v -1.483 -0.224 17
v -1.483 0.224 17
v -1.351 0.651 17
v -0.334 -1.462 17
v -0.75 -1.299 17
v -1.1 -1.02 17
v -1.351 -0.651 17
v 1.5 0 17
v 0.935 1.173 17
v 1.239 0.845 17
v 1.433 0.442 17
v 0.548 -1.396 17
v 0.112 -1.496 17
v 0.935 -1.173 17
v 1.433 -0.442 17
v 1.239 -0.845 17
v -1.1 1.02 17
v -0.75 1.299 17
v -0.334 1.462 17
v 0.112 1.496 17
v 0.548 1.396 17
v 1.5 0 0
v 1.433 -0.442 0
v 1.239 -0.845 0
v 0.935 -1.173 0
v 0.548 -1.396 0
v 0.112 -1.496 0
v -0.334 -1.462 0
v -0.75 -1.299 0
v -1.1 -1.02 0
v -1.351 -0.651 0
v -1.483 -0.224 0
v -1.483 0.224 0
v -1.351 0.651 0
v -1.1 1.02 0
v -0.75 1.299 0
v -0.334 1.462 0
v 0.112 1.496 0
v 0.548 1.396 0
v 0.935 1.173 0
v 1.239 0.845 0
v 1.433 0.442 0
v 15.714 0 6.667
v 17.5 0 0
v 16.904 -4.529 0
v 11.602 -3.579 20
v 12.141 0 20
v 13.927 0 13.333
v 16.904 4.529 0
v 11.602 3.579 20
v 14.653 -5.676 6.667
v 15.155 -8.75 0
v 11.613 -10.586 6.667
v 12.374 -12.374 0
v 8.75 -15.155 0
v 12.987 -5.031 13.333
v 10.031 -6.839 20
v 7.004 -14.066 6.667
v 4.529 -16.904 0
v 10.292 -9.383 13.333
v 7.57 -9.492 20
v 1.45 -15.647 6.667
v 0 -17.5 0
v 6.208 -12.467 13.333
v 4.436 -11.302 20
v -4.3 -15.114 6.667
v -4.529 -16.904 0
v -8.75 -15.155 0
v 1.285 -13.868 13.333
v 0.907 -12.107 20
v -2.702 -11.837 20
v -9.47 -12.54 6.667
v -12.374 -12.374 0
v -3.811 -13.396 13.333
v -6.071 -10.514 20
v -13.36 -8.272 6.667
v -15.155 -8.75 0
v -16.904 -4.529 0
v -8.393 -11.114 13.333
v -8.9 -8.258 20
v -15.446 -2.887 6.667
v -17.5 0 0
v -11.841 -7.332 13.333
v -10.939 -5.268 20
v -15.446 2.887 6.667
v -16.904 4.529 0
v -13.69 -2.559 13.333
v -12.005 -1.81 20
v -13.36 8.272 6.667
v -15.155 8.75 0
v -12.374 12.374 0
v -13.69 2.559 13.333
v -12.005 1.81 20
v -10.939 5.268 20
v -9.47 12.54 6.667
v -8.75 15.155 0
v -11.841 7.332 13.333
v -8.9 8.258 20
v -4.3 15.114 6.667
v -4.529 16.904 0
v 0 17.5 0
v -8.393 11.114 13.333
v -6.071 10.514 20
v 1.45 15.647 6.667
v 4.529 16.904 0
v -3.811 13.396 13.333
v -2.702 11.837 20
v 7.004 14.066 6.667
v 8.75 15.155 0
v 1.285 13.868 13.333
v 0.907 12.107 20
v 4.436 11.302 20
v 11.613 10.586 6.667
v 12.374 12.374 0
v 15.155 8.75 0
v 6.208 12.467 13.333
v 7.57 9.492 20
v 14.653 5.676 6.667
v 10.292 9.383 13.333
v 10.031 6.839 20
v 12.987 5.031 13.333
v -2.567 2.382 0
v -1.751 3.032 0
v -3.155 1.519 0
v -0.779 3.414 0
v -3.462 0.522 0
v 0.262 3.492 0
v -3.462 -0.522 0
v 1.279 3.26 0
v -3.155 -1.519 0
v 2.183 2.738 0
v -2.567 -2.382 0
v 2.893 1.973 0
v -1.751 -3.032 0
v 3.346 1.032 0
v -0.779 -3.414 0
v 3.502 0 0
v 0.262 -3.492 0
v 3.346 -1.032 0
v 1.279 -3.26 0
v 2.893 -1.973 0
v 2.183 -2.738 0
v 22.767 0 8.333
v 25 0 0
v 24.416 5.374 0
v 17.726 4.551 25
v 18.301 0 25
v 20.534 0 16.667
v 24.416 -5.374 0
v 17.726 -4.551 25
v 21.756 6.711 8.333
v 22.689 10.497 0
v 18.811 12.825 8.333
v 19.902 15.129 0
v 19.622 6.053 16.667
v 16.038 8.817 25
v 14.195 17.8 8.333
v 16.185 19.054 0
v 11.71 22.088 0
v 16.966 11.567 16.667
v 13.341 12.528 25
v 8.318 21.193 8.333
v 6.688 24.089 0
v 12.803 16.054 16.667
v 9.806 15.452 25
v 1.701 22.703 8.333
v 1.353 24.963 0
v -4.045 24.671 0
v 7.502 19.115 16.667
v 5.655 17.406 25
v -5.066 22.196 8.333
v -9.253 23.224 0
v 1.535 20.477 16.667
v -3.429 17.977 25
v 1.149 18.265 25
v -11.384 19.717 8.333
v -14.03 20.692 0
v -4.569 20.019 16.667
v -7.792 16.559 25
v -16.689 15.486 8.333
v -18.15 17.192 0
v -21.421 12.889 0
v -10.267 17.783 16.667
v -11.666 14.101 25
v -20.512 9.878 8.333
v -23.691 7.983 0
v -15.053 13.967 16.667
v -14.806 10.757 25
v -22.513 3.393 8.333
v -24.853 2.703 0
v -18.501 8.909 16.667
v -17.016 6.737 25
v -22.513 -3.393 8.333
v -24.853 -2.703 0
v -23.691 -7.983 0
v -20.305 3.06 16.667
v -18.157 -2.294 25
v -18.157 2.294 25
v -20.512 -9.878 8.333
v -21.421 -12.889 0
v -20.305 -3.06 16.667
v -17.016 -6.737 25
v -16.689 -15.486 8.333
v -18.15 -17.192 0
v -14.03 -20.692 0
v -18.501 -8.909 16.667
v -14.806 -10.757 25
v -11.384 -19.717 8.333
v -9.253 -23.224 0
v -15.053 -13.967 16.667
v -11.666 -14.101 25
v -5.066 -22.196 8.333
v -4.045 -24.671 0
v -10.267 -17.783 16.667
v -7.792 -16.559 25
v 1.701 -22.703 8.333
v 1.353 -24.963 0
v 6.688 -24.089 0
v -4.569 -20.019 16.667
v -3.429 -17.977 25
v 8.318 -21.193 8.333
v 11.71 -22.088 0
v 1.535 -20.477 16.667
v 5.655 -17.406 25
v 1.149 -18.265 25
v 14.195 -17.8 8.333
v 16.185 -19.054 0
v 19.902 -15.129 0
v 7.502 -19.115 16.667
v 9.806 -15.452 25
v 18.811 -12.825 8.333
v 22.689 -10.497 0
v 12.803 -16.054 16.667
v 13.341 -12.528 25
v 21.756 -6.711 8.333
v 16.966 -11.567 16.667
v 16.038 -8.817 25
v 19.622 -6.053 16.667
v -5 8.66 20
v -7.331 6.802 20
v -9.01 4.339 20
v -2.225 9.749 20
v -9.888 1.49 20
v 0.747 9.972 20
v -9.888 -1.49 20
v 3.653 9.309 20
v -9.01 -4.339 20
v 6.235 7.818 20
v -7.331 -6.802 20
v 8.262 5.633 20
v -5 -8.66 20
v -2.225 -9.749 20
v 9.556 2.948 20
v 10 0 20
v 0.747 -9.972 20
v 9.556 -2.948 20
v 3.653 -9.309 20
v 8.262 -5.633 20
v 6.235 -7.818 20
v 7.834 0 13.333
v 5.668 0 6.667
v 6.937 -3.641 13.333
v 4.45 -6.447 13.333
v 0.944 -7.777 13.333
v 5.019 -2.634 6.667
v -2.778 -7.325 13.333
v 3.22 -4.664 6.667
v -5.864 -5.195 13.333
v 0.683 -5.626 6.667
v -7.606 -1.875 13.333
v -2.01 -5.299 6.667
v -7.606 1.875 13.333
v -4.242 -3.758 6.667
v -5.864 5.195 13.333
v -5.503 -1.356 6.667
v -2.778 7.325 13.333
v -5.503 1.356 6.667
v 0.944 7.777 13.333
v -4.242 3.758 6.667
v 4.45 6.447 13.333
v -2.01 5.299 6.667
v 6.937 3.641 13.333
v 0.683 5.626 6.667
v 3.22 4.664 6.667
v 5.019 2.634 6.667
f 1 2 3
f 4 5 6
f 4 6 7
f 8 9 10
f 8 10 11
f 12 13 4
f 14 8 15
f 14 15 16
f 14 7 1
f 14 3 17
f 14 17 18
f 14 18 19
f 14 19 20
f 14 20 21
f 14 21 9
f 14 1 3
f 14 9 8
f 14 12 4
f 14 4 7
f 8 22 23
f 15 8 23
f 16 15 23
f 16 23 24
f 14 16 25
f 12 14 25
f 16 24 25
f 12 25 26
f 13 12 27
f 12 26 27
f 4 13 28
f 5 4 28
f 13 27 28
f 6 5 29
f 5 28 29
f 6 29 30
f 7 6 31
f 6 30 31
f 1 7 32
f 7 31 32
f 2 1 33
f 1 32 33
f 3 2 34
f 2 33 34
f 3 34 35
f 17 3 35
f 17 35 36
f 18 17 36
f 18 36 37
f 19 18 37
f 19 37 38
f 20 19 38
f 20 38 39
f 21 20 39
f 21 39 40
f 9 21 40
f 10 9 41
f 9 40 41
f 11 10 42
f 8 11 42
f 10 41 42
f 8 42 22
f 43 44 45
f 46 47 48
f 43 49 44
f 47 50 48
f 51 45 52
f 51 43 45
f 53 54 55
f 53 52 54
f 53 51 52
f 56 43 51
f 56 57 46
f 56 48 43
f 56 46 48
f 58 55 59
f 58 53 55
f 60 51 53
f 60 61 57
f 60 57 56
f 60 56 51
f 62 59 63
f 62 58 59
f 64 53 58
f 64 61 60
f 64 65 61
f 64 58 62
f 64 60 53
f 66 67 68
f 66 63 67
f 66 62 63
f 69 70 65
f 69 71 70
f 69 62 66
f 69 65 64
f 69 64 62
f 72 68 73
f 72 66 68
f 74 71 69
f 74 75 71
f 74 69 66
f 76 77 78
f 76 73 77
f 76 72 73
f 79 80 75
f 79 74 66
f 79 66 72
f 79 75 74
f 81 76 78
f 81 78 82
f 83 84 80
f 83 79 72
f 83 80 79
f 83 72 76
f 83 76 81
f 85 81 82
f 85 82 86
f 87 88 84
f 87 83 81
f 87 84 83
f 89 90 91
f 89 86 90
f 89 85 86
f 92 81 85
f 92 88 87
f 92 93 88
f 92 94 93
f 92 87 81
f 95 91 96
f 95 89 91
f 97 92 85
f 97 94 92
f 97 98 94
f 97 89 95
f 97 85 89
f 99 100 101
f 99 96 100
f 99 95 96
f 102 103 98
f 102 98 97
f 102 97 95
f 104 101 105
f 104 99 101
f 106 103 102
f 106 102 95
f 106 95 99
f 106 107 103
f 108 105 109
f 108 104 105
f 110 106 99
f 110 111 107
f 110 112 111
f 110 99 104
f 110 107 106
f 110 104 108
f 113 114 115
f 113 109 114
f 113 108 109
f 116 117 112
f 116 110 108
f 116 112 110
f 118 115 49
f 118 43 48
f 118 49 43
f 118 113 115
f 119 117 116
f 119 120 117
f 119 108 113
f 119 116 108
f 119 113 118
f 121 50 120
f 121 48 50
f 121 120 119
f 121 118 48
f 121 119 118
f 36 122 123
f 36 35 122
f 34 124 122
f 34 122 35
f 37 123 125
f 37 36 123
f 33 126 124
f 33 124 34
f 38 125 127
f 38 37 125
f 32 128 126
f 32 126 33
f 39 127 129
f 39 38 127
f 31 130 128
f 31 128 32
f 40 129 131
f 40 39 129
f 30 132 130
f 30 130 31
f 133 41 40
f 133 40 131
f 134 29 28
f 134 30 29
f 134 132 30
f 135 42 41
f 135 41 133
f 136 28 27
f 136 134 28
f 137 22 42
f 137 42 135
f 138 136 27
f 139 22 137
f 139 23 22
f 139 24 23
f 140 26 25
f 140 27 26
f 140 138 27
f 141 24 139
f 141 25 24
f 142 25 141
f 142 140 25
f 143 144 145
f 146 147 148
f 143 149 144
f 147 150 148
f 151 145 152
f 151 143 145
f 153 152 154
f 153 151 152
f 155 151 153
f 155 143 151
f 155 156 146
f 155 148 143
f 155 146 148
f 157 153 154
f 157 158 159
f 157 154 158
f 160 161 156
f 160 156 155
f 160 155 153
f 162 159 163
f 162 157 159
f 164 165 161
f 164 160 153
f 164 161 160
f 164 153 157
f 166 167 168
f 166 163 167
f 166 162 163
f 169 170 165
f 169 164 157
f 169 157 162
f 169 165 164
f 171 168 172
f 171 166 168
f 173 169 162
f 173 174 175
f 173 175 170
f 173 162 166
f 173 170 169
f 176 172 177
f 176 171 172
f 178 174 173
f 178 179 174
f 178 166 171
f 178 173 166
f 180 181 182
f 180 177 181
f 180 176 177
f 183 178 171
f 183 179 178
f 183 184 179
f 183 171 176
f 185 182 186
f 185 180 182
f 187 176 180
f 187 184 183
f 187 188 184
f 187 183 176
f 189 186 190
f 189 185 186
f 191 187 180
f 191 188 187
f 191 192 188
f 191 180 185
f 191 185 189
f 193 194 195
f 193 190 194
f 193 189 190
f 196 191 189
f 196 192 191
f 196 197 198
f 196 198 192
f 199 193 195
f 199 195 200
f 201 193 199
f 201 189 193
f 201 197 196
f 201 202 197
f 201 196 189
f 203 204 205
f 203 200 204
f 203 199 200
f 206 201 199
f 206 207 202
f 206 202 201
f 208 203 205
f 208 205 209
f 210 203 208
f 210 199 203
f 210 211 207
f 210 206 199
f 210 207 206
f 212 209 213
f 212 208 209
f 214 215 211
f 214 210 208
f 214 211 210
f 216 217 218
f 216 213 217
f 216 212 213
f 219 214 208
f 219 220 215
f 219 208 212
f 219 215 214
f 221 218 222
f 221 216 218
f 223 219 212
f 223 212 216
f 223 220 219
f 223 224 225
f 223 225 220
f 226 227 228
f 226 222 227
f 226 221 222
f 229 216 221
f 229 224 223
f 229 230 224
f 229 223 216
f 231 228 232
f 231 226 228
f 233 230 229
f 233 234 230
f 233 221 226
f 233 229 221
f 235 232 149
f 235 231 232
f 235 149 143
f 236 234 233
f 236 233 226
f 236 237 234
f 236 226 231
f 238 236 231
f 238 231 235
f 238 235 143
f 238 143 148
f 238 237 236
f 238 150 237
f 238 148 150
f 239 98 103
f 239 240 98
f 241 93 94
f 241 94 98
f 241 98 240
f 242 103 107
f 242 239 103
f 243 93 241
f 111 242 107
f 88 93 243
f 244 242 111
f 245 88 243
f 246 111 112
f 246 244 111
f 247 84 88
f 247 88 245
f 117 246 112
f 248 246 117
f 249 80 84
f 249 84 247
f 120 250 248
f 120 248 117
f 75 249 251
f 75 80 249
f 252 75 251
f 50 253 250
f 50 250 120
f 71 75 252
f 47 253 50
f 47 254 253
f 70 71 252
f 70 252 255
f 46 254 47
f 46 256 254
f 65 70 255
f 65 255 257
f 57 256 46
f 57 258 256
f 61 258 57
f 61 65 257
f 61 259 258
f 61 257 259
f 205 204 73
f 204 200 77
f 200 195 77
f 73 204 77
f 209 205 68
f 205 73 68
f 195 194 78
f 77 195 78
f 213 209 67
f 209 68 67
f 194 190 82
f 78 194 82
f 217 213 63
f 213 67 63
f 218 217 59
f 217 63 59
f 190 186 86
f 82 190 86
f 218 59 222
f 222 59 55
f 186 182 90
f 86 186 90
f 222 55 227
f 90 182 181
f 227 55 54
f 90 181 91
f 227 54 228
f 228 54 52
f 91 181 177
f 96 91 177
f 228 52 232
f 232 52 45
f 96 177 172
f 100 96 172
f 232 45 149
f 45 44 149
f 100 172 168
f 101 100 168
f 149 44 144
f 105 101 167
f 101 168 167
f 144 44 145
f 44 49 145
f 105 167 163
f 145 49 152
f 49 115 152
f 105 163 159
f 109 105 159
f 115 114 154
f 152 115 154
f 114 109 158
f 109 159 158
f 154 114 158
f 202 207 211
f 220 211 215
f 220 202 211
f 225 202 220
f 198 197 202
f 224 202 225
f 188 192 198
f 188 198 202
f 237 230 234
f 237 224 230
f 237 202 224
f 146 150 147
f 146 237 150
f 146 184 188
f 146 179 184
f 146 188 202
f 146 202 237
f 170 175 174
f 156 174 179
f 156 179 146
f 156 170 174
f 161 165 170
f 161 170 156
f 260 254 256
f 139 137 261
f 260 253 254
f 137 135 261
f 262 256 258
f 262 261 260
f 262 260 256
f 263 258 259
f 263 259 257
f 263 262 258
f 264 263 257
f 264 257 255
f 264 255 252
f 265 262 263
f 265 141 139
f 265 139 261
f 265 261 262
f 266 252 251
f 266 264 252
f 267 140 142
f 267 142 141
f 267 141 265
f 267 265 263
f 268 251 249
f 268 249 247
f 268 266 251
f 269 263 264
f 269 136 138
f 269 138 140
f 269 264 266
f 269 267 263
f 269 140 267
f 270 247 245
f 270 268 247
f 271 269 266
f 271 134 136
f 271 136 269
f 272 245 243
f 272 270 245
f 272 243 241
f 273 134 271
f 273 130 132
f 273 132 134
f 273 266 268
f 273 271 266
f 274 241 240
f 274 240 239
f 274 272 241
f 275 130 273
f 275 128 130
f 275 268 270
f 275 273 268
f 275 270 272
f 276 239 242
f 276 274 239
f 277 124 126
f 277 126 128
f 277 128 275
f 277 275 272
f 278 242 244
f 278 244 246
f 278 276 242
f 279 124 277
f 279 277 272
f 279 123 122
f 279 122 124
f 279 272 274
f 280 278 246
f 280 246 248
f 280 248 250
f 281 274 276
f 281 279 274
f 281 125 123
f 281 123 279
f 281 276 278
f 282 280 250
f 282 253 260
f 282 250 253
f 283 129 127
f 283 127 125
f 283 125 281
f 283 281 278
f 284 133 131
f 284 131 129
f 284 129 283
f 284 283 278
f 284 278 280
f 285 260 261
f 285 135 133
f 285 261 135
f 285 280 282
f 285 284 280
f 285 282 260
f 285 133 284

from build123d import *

# Parameters (mm, degrees)
SKETCH_R        = 25
PAD_DEPTH       = 25
PAD_TAPER       = 15
SKETCH001_R     = 17.5
POCKET_DEPTH    = 20
POCKET_TAPER    = 15
SKETCH002_R     = 10
PAD001_DEPTH    = 20
PAD001_TAPER    = 18
SKETCH003_R     = 1.5
POCKET001_DEPTH = 17


with BuildPart() as part:
    # Sketch → Pad (new body)
    with BuildSketch(Plane.XY):
        Circle(SKETCH_R)
    extrude(amount=PAD_DEPTH, taper=PAD_TAPER)

    # Sketch001 (on Face2 of Pad) → Pocket (cut)
    with BuildSketch(Plane(origin=(0, 0, 0), x_dir=(1, 0, 0), z_dir=(0, 0, -1))):
        Circle(SKETCH001_R)
    extrude(amount=-POCKET_DEPTH, taper=POCKET_TAPER, mode=Mode.SUBTRACT)

    # Sketch002 (on Face5 of Pocket) → Pad001 (join)
    with BuildSketch(Plane(origin=(0, 0, 20), x_dir=(1, 0, 0), z_dir=(0, 0, -1))):
        Circle(SKETCH002_R)
    extrude(amount=PAD001_DEPTH, taper=PAD001_TAPER)

    # Sketch003 (on Face7 of Pad001) → Pocket001 (cut)
    with BuildSketch(Plane(origin=(0, 0, 0), x_dir=(1, 0, 0), z_dir=(0, 0, -1))):
        Circle(SKETCH003_R)
    extrude(amount=-POCKET001_DEPTH, mode=Mode.SUBTRACT)


solid = part.part
